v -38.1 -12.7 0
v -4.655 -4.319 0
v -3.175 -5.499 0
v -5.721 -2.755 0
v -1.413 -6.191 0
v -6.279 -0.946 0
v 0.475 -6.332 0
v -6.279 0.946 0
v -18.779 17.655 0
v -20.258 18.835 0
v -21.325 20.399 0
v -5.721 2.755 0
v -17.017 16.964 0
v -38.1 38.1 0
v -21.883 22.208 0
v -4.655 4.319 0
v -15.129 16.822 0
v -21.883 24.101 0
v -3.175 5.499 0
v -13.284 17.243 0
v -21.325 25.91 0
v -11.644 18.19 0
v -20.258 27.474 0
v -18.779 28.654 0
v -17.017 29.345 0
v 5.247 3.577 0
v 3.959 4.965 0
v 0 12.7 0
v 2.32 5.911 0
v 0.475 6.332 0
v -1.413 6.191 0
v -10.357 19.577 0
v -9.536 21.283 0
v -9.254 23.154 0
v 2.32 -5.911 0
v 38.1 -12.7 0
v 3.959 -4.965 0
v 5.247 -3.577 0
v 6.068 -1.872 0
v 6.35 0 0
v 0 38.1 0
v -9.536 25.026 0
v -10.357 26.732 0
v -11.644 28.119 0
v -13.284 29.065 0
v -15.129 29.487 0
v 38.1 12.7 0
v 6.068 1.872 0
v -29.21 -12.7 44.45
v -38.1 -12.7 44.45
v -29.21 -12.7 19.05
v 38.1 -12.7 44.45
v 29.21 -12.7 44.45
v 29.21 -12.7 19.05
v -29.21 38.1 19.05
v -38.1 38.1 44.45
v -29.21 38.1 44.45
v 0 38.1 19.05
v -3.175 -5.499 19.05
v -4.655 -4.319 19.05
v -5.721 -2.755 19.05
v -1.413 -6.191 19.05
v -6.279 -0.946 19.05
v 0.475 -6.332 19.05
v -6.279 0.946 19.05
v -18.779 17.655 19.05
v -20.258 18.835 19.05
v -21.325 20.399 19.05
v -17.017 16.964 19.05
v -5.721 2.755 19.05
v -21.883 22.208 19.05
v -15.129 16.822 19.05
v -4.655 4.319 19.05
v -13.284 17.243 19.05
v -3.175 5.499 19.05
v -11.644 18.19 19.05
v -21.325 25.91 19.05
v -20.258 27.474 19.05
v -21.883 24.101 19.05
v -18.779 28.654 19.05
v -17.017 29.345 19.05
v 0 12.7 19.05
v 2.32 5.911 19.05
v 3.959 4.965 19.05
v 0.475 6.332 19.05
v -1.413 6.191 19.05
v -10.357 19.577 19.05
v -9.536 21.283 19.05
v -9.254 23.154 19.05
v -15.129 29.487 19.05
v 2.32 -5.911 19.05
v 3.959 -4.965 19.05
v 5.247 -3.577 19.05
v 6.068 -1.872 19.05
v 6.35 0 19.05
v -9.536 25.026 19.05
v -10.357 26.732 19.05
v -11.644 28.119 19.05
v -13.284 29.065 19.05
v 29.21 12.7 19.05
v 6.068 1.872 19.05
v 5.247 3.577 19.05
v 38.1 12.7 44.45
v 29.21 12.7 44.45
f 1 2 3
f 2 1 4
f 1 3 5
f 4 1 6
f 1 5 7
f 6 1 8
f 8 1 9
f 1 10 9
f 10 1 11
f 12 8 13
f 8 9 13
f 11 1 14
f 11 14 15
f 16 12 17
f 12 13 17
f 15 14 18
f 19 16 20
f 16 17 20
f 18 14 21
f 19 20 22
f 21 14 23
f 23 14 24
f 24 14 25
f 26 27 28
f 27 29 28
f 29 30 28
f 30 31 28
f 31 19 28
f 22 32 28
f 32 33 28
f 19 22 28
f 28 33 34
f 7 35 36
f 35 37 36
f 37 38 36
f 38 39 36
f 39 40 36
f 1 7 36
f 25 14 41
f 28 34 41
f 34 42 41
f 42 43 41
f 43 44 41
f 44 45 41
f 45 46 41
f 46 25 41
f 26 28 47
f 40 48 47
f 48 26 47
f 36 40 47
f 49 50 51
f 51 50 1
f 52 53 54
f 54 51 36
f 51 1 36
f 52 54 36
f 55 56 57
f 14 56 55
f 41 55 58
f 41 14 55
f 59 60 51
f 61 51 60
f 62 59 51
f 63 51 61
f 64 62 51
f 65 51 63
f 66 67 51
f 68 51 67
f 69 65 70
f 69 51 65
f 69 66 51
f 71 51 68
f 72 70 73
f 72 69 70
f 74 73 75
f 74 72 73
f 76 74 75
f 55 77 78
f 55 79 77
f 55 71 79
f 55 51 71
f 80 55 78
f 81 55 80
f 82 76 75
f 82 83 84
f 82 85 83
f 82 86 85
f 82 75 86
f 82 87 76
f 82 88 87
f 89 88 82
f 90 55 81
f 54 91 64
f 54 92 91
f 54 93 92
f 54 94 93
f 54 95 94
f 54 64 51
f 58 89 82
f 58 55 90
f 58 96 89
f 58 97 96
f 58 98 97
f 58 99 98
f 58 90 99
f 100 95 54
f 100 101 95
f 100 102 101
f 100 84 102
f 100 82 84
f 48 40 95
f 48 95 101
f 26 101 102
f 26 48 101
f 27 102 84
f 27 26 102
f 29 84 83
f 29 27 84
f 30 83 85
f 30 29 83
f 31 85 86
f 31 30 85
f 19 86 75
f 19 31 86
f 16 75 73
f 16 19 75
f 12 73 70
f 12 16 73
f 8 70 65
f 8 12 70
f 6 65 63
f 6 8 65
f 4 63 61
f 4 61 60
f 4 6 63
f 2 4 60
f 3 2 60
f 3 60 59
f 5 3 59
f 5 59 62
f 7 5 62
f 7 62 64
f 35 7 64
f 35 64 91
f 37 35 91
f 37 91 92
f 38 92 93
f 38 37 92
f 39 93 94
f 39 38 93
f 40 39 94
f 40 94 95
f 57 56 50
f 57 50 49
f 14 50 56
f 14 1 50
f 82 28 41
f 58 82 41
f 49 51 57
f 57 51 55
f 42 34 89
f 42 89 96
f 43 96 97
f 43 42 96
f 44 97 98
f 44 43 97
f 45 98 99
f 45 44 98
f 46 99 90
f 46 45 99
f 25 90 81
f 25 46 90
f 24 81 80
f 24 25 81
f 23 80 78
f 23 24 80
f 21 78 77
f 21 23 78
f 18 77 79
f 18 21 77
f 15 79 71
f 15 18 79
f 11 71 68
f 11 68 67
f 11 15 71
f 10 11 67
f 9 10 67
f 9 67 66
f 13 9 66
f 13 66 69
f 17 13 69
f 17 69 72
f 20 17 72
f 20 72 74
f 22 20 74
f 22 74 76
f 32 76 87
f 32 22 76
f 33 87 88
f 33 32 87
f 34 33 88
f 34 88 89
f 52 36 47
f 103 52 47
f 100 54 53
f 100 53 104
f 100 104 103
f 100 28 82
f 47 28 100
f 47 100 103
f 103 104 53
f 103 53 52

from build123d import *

# Parameters (mm, degrees)
F0_R     = 6.35
F1_DEPTH = 19.05
F2_W     = 8.89
F2_H     = 25.4
F3_DEPTH = 25.4
F2_H_2   = 50.8
F4_DEPTH = 25.4


with BuildPart() as f1:
    # F0 (on Top) → F1 (new body)
    with BuildSketch(Plane.XY):
        Polygon((38.1, -12.7), (38.1, 12.7), (0, 12.7), (0, 38.1), (-38.1, 38.1), (-38.1, 12.7), (-38.1, -12.7), align=None)
        Circle(F0_R, mode=Mode.SUBTRACT)
        with Locations((-15.603517, 23.15443)):
            Circle(F0_R, mode=Mode.SUBTRACT)
    extrude(amount=F1_DEPTH)

    # F2 (on face) → F3 (join)
    with BuildSketch(Plane.XY.offset(19.05)):
        with Locations((33.655, 0)):
            Rectangle(F2_W, F2_H)
    extrude(amount=F3_DEPTH)

    # F2 (on face) → F4 (join)
    with BuildSketch(Plane.XY.offset(19.05)):
        with Locations((-33.655, 12.7)):
            Rectangle(F2_W, F2_H_2)
        with Locations((33.655, 0)):
            Rectangle(F2_W, F2_H)
    extrude(amount=F4_DEPTH)


solid = f1.part
